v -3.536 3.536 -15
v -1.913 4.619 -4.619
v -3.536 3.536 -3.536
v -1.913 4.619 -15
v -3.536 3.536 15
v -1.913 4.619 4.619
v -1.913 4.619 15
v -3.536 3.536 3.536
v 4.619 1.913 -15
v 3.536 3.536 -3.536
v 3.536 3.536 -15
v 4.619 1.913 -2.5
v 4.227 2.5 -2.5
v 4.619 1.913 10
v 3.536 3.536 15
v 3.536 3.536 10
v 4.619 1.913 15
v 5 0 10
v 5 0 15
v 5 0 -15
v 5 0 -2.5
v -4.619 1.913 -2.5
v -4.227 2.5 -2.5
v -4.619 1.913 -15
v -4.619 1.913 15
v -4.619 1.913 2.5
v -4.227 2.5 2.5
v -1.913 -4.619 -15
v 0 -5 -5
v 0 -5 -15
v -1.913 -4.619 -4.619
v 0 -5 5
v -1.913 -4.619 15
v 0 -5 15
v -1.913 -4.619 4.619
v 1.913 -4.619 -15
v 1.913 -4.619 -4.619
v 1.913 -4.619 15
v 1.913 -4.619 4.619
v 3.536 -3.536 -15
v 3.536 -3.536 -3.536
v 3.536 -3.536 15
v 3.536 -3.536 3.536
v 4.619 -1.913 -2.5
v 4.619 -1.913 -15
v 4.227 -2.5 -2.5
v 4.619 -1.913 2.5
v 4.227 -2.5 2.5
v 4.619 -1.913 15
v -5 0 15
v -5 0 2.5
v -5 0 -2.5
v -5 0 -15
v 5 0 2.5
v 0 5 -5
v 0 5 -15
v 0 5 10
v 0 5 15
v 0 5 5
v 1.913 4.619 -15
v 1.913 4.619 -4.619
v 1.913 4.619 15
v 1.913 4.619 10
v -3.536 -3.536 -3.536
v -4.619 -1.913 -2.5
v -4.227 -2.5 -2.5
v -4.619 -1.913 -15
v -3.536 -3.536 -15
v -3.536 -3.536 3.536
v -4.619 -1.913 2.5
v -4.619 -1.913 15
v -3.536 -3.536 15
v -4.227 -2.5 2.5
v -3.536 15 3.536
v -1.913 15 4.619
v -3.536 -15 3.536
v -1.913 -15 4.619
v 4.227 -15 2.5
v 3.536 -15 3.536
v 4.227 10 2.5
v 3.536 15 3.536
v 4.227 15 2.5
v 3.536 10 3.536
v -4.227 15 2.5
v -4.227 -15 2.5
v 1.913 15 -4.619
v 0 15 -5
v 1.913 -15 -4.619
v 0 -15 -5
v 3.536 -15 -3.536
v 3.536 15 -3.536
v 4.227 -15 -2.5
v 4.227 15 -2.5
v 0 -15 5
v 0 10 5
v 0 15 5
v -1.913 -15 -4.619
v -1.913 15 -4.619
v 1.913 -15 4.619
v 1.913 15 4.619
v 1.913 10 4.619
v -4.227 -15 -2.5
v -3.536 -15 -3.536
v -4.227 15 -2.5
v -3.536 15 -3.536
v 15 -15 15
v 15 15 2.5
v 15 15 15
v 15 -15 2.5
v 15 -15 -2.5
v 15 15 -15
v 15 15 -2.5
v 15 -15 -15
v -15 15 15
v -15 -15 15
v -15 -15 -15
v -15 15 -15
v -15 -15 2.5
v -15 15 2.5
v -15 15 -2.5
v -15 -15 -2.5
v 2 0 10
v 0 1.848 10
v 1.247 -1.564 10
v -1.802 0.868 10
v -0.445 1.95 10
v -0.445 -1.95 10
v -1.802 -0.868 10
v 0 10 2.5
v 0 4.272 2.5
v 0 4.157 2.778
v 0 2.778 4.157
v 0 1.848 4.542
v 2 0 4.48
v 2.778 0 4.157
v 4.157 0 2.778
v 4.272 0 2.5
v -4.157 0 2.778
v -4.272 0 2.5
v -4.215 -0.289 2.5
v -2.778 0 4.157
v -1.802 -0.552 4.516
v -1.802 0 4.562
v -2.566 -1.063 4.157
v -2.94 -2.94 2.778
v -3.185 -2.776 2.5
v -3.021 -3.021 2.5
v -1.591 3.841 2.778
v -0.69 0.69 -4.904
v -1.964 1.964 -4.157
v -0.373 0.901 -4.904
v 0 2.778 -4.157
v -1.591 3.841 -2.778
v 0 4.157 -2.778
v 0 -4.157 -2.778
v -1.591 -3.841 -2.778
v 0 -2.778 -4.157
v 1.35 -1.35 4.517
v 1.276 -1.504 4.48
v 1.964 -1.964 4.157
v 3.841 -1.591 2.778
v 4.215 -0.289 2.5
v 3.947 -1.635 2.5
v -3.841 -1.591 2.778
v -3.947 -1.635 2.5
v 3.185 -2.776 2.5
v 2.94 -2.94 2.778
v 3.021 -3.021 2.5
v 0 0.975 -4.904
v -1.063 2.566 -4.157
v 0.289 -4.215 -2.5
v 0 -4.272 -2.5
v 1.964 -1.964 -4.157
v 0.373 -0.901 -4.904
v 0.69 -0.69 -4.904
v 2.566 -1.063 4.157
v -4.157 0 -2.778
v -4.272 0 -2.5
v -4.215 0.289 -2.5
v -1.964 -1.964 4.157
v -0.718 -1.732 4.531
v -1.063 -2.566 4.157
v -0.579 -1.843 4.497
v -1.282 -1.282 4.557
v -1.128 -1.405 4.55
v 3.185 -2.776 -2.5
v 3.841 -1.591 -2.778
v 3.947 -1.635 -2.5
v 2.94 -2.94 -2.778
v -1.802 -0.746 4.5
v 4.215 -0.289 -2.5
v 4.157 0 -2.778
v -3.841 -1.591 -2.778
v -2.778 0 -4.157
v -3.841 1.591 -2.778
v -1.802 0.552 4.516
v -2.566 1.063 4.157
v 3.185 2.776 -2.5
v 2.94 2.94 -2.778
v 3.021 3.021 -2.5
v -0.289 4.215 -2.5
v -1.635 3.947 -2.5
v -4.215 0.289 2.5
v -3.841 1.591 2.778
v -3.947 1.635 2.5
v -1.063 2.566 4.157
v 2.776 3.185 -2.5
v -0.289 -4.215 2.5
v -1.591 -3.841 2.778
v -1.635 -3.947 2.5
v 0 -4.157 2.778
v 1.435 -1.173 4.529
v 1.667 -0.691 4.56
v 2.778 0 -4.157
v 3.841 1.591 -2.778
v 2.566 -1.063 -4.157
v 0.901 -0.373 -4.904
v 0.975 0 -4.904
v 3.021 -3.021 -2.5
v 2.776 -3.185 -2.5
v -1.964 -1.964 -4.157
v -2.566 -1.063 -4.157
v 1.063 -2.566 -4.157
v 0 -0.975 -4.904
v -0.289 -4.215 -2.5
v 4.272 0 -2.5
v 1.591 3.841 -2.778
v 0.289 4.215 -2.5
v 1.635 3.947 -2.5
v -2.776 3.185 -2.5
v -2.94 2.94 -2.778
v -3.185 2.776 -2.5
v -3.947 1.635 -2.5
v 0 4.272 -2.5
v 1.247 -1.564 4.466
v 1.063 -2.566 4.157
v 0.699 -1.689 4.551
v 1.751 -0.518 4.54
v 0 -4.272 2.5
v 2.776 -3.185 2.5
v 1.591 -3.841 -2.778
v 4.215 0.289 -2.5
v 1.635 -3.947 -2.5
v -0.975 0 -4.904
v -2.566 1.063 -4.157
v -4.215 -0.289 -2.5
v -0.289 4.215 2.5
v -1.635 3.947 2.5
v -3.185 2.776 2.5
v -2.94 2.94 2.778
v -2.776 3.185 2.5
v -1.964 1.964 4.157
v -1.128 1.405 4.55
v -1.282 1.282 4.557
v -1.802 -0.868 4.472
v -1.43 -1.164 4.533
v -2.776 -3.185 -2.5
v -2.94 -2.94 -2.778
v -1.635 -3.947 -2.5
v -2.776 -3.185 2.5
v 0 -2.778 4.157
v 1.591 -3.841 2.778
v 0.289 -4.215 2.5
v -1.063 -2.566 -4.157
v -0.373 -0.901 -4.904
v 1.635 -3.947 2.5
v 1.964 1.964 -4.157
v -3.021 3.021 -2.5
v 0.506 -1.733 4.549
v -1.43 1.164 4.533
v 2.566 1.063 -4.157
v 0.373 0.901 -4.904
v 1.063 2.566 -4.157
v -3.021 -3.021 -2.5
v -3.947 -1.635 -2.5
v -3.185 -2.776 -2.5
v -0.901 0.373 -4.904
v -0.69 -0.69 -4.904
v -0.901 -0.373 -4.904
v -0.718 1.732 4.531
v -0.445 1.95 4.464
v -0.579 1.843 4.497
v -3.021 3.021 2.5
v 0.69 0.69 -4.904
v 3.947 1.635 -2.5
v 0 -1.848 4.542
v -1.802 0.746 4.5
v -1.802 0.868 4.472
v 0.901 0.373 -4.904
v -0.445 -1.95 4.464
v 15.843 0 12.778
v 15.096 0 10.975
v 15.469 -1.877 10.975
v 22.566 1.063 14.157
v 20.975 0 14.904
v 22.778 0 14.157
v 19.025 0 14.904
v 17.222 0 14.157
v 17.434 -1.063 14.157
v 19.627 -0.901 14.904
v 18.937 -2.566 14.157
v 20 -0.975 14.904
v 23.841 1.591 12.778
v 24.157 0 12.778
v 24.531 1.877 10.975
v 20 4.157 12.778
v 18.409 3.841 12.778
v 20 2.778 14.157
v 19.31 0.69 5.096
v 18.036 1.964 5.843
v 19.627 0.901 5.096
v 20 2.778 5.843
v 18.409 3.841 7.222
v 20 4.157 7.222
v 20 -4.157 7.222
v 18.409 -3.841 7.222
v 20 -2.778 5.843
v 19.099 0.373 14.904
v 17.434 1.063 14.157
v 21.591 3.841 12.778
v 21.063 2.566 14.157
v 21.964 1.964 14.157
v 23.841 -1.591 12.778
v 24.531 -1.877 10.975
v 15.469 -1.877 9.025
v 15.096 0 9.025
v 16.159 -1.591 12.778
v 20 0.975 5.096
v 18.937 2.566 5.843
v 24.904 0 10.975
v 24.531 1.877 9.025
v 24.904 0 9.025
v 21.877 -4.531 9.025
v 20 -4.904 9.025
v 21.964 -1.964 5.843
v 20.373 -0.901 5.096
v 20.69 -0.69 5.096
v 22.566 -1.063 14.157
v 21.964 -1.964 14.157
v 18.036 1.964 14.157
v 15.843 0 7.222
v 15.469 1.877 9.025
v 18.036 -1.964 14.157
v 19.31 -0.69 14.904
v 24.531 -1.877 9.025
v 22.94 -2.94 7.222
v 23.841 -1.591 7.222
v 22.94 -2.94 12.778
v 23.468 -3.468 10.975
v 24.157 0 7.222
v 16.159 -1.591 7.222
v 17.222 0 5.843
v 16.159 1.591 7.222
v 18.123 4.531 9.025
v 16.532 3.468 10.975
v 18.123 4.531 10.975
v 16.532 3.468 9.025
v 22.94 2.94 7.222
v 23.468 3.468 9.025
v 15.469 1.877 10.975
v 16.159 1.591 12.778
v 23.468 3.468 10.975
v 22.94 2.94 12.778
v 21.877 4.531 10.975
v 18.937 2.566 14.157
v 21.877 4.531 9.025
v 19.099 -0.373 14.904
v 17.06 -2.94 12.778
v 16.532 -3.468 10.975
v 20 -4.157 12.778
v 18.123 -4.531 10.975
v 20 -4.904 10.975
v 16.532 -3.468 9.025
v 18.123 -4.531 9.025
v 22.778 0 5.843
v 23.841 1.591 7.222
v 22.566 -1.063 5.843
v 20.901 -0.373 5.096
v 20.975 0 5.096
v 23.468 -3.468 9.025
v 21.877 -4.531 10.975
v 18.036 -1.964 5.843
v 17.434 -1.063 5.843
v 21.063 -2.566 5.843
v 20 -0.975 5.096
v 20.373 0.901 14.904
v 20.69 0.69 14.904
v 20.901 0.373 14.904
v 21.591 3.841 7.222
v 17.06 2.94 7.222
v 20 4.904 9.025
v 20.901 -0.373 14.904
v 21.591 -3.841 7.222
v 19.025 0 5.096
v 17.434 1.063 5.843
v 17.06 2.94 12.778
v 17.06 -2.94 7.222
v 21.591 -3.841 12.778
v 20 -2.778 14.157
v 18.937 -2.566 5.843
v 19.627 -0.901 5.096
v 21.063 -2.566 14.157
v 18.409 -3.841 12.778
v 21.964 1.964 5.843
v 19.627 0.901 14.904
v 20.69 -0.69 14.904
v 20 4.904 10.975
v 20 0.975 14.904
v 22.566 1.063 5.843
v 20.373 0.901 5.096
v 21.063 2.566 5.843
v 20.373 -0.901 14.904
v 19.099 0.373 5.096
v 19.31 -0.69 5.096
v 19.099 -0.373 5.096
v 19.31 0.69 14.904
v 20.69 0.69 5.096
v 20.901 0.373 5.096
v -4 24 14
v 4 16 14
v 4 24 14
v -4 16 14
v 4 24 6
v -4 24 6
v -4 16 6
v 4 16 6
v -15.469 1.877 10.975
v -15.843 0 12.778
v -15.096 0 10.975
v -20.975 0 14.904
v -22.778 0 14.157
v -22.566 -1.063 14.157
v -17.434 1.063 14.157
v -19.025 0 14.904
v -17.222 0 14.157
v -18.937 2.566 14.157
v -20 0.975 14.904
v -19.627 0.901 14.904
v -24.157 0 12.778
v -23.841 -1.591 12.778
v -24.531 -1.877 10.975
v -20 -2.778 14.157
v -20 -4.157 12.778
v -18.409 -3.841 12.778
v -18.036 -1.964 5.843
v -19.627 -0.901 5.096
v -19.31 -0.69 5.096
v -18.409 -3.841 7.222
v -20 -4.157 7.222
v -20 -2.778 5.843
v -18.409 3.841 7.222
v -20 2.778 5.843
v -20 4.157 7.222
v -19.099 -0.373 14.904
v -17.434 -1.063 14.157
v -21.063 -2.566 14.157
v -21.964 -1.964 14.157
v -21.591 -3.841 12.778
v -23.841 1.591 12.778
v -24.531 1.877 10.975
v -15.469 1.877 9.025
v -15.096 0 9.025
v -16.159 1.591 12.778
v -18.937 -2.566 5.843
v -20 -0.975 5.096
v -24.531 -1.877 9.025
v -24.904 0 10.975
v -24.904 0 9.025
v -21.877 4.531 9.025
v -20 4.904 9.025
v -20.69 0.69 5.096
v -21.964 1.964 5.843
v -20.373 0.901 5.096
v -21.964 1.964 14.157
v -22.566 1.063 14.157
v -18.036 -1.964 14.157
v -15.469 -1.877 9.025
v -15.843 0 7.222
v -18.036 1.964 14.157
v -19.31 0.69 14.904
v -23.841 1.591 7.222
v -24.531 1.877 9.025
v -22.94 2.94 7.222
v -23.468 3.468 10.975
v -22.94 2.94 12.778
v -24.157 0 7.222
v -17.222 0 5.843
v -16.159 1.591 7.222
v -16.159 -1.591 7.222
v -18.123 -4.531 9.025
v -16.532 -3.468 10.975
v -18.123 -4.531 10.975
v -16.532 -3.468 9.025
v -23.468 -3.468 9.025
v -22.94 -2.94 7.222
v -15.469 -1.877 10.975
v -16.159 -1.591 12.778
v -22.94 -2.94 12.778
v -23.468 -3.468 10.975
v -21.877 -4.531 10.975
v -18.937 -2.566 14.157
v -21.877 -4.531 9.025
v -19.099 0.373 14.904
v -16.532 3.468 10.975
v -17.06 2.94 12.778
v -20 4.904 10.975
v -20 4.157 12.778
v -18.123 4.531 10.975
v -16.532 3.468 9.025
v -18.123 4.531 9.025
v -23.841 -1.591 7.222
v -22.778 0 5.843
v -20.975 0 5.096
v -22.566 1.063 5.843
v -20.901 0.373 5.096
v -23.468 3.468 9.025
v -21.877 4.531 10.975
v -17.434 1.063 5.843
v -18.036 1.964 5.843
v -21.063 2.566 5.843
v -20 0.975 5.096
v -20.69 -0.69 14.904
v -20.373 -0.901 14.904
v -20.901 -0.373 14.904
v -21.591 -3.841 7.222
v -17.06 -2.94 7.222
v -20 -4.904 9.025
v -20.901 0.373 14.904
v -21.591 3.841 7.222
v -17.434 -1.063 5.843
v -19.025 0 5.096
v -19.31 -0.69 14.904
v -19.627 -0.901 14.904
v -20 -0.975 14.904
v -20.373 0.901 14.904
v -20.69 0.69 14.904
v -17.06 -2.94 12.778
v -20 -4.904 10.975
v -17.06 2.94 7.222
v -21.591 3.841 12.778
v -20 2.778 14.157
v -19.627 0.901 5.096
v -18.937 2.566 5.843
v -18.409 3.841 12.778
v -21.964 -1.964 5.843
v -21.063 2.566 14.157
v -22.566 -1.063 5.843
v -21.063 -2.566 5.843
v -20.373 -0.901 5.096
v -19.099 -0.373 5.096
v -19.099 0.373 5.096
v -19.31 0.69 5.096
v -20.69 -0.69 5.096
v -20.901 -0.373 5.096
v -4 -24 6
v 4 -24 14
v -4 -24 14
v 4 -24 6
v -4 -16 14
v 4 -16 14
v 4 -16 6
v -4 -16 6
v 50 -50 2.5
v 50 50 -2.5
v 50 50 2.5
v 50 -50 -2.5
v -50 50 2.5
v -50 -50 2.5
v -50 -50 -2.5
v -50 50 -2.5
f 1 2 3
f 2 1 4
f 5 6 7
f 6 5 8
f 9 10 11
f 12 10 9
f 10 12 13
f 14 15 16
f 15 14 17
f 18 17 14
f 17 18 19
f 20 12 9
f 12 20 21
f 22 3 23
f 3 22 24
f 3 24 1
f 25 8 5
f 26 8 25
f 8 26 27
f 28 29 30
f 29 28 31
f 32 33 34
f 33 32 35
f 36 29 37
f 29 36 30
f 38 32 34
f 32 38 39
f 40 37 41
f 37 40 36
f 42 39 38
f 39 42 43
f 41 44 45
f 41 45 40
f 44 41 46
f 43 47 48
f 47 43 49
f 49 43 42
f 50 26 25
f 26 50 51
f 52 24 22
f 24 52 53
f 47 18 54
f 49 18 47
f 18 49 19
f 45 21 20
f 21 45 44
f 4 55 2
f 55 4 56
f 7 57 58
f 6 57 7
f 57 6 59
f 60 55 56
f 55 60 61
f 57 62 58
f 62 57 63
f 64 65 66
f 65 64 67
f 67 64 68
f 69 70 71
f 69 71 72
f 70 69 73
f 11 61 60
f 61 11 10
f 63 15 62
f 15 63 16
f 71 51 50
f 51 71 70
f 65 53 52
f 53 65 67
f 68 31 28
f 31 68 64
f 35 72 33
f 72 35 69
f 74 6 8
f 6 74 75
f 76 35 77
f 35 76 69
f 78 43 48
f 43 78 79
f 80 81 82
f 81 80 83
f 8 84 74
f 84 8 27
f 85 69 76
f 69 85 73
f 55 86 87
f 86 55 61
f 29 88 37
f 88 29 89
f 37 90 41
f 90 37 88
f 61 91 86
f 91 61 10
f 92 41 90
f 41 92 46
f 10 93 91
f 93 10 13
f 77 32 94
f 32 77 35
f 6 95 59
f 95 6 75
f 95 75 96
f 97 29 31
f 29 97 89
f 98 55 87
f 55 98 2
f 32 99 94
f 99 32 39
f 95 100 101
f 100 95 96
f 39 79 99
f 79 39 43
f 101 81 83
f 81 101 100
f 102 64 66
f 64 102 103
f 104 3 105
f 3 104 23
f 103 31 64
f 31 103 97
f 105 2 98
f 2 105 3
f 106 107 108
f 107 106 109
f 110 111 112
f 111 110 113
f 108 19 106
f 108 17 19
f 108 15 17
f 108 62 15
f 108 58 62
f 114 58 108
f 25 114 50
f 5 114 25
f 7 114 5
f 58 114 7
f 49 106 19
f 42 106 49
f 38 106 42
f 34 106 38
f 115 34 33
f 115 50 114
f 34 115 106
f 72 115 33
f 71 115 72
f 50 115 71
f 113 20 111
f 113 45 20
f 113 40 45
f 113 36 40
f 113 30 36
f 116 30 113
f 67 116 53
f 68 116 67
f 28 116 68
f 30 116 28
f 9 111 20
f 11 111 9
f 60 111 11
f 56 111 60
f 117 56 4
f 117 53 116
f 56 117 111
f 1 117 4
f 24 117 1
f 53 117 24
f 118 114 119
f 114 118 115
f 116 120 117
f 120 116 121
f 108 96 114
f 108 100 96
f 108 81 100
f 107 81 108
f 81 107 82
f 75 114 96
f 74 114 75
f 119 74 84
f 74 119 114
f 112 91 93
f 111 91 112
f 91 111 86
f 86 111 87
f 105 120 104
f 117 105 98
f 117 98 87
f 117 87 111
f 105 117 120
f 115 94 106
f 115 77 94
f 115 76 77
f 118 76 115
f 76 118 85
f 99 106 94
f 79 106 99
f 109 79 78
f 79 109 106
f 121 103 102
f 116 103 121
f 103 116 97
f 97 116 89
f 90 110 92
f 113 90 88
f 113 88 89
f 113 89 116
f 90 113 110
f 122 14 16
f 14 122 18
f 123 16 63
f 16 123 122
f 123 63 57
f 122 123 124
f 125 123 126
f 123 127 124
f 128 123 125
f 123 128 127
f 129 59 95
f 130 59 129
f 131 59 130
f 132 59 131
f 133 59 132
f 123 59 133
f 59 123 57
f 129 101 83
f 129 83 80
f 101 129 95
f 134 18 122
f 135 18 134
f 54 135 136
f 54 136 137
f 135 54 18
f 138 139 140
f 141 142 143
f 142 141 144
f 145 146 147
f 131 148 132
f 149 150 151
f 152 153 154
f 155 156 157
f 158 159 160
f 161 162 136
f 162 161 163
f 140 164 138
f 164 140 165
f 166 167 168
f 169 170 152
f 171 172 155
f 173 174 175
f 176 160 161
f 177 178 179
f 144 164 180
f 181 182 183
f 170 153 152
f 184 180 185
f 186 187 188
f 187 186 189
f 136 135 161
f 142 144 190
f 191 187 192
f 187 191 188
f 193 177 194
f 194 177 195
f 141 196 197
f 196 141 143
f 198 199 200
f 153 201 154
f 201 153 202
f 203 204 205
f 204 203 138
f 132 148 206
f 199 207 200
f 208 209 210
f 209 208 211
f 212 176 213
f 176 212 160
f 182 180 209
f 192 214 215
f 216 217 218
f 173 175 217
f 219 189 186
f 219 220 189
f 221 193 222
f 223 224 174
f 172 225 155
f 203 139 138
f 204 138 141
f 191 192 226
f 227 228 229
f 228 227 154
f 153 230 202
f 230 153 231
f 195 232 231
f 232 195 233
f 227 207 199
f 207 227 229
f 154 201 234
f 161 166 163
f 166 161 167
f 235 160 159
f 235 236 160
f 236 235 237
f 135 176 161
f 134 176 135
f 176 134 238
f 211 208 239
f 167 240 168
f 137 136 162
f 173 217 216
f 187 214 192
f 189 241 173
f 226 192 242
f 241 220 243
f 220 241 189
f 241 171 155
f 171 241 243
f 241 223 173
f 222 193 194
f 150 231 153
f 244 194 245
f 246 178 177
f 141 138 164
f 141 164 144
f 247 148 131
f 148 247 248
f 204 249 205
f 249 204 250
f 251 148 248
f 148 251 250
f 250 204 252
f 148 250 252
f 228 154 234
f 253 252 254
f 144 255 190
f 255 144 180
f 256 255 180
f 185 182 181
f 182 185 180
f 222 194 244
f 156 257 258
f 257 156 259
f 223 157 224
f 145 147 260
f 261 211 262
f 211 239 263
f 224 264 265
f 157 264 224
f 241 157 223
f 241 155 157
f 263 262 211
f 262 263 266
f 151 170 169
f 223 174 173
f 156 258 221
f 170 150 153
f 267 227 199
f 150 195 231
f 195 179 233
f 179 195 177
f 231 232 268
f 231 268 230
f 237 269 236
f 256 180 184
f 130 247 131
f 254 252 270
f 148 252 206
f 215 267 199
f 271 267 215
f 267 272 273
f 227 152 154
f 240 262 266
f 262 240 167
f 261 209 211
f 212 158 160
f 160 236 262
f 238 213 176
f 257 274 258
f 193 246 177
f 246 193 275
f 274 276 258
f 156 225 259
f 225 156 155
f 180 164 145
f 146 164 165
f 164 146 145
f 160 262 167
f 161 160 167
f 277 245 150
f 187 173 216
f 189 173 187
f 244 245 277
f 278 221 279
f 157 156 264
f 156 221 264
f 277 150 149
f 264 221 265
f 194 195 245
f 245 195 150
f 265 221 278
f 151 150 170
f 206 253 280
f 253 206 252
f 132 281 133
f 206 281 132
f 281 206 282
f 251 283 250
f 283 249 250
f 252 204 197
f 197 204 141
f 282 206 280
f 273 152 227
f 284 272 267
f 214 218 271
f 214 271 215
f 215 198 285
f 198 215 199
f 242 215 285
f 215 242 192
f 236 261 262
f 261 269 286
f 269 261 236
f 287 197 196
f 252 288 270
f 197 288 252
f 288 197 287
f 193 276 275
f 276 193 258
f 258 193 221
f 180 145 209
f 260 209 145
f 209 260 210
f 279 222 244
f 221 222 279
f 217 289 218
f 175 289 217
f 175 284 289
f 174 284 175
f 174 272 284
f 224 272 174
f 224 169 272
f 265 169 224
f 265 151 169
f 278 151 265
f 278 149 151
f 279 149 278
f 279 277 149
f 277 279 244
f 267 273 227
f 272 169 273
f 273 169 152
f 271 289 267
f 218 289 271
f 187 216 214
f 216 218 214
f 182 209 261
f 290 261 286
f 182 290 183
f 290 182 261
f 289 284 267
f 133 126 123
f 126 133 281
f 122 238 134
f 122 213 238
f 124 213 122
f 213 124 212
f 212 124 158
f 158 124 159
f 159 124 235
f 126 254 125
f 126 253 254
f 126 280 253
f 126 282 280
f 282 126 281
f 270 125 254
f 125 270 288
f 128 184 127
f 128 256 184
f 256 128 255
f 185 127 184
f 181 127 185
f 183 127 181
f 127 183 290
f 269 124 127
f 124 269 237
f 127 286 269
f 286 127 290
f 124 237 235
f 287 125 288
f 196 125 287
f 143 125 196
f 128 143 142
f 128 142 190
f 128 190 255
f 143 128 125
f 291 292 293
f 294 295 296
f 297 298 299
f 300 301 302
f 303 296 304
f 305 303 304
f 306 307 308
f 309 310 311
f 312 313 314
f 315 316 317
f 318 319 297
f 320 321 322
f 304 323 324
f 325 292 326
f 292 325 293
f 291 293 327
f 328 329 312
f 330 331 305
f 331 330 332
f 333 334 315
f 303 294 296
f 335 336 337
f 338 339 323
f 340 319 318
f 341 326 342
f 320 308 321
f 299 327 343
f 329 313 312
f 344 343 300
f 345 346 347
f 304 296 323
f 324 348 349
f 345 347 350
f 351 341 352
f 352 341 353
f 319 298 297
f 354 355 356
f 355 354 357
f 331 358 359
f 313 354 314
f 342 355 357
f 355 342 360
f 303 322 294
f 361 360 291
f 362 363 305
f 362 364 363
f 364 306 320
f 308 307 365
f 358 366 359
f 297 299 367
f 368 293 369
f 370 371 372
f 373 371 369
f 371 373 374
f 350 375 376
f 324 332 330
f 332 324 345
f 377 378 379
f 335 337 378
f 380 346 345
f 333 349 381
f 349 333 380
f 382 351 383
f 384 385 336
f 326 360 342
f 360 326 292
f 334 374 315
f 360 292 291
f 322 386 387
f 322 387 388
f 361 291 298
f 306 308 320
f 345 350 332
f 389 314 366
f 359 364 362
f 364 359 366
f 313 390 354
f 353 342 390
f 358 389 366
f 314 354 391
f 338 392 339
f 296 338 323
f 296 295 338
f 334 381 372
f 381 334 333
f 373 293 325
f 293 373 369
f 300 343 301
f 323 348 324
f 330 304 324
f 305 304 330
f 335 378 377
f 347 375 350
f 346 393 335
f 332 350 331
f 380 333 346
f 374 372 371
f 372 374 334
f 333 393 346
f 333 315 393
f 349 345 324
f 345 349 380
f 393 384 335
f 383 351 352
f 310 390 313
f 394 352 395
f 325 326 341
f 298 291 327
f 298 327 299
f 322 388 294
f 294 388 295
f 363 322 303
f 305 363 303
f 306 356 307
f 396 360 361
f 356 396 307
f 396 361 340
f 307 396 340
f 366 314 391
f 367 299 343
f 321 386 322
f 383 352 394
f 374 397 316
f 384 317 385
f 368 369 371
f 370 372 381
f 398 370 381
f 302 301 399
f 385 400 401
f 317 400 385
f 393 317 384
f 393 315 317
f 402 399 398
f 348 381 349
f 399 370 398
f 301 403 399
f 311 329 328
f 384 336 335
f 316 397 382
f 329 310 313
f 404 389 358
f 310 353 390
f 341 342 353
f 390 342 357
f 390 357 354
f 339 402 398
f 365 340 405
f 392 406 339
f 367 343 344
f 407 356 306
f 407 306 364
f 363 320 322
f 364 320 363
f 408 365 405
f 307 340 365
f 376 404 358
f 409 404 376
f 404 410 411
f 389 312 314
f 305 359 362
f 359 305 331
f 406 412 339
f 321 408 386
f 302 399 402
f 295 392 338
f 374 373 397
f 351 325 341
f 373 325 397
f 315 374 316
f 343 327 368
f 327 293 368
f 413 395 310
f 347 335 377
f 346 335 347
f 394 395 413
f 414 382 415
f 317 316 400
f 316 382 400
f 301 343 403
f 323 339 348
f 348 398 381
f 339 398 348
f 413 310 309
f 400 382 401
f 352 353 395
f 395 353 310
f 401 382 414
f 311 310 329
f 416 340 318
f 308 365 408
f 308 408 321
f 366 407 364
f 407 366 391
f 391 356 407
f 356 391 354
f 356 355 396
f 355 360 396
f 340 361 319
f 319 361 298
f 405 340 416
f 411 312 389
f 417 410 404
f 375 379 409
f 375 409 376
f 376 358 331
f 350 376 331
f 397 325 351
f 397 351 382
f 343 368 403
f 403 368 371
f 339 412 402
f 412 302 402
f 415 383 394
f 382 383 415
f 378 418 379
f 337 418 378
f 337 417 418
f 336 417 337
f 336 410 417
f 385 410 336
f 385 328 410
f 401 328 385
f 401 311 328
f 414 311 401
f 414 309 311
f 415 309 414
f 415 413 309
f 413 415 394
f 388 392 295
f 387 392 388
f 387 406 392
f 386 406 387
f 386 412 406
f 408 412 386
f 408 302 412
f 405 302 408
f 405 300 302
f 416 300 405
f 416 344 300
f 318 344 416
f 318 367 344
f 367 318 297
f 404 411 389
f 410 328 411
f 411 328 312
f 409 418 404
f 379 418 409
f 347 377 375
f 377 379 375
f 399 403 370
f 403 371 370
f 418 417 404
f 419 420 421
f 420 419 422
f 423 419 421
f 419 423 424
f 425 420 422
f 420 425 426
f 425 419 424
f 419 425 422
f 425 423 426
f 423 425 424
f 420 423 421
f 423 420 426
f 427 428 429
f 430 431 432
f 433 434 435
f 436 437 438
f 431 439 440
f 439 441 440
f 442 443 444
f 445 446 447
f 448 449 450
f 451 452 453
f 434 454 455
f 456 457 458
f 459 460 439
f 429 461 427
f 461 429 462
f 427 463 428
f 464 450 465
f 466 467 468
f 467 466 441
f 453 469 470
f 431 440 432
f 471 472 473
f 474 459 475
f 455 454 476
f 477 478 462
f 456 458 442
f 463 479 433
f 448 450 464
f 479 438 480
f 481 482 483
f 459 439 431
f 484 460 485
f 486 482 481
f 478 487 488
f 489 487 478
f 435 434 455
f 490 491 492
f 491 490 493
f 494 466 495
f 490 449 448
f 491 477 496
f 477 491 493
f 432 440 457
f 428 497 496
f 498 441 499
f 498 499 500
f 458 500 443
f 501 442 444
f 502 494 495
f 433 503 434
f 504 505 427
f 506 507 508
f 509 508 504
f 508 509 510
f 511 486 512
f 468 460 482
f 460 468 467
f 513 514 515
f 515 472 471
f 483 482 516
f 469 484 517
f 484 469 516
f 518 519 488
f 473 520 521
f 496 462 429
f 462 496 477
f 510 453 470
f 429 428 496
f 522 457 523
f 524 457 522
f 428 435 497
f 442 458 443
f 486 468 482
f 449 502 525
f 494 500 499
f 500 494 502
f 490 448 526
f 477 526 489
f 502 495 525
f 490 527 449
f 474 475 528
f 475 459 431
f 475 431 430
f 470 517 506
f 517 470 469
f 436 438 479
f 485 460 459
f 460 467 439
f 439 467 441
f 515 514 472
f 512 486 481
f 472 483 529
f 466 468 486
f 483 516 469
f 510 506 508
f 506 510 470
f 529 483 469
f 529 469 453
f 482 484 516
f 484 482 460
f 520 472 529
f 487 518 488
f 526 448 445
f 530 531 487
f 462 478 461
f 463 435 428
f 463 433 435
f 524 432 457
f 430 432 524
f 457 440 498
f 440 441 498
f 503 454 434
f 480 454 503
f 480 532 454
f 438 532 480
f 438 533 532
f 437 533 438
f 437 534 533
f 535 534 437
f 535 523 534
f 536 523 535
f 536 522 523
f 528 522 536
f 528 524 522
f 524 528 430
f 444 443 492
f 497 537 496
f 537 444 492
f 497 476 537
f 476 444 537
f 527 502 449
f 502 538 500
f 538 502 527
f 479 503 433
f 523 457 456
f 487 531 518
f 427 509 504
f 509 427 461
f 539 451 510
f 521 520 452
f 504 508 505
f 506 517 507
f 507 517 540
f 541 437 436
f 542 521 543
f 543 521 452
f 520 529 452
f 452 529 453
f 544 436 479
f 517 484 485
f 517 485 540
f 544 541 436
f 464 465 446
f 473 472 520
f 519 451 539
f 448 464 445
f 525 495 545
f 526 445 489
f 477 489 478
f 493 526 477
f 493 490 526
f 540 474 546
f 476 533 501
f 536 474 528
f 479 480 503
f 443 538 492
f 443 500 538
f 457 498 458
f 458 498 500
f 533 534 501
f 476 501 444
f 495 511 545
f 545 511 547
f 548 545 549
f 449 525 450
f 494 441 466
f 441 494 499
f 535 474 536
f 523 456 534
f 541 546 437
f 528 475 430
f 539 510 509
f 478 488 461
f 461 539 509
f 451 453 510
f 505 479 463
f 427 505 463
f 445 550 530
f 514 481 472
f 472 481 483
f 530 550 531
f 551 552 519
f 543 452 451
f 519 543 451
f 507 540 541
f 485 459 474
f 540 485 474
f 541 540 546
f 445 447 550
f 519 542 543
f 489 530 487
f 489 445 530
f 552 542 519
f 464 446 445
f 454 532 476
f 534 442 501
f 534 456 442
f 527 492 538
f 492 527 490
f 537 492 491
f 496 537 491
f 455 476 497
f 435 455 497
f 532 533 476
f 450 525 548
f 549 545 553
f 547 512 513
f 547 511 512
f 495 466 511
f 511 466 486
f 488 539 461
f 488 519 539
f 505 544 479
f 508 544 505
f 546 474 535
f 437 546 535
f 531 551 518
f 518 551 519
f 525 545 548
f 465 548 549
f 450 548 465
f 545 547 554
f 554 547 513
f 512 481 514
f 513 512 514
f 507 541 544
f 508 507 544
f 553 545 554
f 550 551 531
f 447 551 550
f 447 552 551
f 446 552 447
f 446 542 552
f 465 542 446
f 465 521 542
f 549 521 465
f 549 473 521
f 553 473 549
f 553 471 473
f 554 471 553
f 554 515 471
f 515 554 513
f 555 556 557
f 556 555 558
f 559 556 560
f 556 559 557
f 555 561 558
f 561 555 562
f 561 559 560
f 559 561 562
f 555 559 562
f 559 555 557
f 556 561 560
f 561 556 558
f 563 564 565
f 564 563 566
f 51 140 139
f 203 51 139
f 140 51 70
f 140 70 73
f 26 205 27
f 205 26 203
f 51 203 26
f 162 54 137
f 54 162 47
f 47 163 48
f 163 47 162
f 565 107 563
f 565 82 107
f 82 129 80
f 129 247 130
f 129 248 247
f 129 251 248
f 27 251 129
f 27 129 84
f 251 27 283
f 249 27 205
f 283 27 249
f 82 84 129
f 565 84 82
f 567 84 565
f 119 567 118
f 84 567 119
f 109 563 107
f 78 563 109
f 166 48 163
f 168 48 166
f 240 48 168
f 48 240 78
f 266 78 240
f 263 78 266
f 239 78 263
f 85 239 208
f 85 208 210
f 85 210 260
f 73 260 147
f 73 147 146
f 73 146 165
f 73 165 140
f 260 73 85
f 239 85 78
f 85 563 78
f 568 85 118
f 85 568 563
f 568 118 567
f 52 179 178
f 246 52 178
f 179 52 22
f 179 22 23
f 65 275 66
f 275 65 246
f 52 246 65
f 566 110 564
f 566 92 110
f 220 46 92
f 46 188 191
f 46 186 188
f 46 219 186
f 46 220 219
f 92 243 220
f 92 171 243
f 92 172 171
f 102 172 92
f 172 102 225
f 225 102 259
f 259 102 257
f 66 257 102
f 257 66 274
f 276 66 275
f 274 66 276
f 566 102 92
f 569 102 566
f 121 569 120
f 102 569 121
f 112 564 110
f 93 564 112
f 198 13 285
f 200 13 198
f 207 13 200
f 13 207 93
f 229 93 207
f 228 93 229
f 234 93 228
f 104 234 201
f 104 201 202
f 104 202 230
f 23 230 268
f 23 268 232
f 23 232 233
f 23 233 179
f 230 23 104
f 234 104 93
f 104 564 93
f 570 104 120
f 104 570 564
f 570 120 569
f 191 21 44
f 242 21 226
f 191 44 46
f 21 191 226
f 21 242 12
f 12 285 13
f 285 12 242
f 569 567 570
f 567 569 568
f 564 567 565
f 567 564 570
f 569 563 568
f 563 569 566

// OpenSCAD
// OpenSCAD Indentation and Folding Test File
// This file contains various OpenSCAD constructs to test indentation and folding

// Basic module definition with nested blocks
module complex_module(size = 10, height = 20) {
    // Local variables
    radius = size / 2;
    
    // Nested transformations
    translate([0, 0, 0]) {
        rotate([0, 0, 45]) {
            cube([size, size, height]);
        }
    }
    
    // Conditional structure
    if (size > 5) {
        sphere(radius);
    } else {
        cylinder(h = height, r = radius);
    }
    
    // For loop with nested structure
    for (i = [0:5]) {
        translate([i * 10, 0, 0]) {
            cube(size = 5);
        }
    }
}

// Function definition with complex expression
function calculate_volume(width, depth, height) = 
    let(
        area = width * depth,
        volume = area * height
    )
    volume;

// Intersection for loop
intersection_for(n = [0:5]) {
    rotate([0, 0, n * 60]) {
        translate([5, 0, 0]) {
            sphere(r = 5);
        }
    }
}

// CSG operations
difference() {
    cube([30, 30, 30], center = true);
    
    union() {
        translate([0, 0, 0]) {
            cylinder(h = 40, r = 5, center = true);
        }
        
        translate([0, 0, 0]) {
            rotate([90, 0, 0]) {
                cylinder(h = 40, r = 5, center = true);
            }
        }
    }
}

// Vector expressions
points = [
    [0, 0, 0],
    [10, 0, 0],
    [10, 10, 0],
    [0, 10, 0],
    [5, 5, 10]
];

// Module instantiation with block
translate([0, 0, 0]) {
    cube(10);
    sphere(5);
    cylinder(h = 10, r = 2);
}

// Multi-line comment for folding test
/* This is a multi-line comment
   that should be foldable in editors
   that support code folding based on
   tree-sitter queries.
   
   It contains multiple paragraphs
   to test the folding capabilities.
*/

// Multi-line string
text_value = "This is a multi-line string
that should also be foldable
in editors that support code folding
based on tree-sitter queries.";

// Let expression
result = let(
    a = 10,
    b = 20,
    c = a + b,
    d = c * 2
) d + 5;

// Nested module calls
translate([0, 0, 0])
    rotate([0, 0, 0])
        scale([1, 1, 1])
            cube(10);

// Main showcase function to test everything together
module showcase() {
    // Base
    translate([0, 0, 0]) {
        cube([100, 100, 5], center = true);
    }
    
    // Complex nested structure
    translate([0, 0, 10]) {
        difference() {
            union() {
                for (i = [0:3]) {
                    rotate([0, 0, i * 90]) {
                        translate([20, 0, 0]) {
                            if (i % 2 == 0) {
                                sphere(5);
                            } else {
                                cube(8, center = true);
                            }
                        }
                    }
                }
            }
            
            // Cutout
            cylinder(h = 30, r = 10, center = true);
        }
    }
}

// Call the showcase function
showcase();
